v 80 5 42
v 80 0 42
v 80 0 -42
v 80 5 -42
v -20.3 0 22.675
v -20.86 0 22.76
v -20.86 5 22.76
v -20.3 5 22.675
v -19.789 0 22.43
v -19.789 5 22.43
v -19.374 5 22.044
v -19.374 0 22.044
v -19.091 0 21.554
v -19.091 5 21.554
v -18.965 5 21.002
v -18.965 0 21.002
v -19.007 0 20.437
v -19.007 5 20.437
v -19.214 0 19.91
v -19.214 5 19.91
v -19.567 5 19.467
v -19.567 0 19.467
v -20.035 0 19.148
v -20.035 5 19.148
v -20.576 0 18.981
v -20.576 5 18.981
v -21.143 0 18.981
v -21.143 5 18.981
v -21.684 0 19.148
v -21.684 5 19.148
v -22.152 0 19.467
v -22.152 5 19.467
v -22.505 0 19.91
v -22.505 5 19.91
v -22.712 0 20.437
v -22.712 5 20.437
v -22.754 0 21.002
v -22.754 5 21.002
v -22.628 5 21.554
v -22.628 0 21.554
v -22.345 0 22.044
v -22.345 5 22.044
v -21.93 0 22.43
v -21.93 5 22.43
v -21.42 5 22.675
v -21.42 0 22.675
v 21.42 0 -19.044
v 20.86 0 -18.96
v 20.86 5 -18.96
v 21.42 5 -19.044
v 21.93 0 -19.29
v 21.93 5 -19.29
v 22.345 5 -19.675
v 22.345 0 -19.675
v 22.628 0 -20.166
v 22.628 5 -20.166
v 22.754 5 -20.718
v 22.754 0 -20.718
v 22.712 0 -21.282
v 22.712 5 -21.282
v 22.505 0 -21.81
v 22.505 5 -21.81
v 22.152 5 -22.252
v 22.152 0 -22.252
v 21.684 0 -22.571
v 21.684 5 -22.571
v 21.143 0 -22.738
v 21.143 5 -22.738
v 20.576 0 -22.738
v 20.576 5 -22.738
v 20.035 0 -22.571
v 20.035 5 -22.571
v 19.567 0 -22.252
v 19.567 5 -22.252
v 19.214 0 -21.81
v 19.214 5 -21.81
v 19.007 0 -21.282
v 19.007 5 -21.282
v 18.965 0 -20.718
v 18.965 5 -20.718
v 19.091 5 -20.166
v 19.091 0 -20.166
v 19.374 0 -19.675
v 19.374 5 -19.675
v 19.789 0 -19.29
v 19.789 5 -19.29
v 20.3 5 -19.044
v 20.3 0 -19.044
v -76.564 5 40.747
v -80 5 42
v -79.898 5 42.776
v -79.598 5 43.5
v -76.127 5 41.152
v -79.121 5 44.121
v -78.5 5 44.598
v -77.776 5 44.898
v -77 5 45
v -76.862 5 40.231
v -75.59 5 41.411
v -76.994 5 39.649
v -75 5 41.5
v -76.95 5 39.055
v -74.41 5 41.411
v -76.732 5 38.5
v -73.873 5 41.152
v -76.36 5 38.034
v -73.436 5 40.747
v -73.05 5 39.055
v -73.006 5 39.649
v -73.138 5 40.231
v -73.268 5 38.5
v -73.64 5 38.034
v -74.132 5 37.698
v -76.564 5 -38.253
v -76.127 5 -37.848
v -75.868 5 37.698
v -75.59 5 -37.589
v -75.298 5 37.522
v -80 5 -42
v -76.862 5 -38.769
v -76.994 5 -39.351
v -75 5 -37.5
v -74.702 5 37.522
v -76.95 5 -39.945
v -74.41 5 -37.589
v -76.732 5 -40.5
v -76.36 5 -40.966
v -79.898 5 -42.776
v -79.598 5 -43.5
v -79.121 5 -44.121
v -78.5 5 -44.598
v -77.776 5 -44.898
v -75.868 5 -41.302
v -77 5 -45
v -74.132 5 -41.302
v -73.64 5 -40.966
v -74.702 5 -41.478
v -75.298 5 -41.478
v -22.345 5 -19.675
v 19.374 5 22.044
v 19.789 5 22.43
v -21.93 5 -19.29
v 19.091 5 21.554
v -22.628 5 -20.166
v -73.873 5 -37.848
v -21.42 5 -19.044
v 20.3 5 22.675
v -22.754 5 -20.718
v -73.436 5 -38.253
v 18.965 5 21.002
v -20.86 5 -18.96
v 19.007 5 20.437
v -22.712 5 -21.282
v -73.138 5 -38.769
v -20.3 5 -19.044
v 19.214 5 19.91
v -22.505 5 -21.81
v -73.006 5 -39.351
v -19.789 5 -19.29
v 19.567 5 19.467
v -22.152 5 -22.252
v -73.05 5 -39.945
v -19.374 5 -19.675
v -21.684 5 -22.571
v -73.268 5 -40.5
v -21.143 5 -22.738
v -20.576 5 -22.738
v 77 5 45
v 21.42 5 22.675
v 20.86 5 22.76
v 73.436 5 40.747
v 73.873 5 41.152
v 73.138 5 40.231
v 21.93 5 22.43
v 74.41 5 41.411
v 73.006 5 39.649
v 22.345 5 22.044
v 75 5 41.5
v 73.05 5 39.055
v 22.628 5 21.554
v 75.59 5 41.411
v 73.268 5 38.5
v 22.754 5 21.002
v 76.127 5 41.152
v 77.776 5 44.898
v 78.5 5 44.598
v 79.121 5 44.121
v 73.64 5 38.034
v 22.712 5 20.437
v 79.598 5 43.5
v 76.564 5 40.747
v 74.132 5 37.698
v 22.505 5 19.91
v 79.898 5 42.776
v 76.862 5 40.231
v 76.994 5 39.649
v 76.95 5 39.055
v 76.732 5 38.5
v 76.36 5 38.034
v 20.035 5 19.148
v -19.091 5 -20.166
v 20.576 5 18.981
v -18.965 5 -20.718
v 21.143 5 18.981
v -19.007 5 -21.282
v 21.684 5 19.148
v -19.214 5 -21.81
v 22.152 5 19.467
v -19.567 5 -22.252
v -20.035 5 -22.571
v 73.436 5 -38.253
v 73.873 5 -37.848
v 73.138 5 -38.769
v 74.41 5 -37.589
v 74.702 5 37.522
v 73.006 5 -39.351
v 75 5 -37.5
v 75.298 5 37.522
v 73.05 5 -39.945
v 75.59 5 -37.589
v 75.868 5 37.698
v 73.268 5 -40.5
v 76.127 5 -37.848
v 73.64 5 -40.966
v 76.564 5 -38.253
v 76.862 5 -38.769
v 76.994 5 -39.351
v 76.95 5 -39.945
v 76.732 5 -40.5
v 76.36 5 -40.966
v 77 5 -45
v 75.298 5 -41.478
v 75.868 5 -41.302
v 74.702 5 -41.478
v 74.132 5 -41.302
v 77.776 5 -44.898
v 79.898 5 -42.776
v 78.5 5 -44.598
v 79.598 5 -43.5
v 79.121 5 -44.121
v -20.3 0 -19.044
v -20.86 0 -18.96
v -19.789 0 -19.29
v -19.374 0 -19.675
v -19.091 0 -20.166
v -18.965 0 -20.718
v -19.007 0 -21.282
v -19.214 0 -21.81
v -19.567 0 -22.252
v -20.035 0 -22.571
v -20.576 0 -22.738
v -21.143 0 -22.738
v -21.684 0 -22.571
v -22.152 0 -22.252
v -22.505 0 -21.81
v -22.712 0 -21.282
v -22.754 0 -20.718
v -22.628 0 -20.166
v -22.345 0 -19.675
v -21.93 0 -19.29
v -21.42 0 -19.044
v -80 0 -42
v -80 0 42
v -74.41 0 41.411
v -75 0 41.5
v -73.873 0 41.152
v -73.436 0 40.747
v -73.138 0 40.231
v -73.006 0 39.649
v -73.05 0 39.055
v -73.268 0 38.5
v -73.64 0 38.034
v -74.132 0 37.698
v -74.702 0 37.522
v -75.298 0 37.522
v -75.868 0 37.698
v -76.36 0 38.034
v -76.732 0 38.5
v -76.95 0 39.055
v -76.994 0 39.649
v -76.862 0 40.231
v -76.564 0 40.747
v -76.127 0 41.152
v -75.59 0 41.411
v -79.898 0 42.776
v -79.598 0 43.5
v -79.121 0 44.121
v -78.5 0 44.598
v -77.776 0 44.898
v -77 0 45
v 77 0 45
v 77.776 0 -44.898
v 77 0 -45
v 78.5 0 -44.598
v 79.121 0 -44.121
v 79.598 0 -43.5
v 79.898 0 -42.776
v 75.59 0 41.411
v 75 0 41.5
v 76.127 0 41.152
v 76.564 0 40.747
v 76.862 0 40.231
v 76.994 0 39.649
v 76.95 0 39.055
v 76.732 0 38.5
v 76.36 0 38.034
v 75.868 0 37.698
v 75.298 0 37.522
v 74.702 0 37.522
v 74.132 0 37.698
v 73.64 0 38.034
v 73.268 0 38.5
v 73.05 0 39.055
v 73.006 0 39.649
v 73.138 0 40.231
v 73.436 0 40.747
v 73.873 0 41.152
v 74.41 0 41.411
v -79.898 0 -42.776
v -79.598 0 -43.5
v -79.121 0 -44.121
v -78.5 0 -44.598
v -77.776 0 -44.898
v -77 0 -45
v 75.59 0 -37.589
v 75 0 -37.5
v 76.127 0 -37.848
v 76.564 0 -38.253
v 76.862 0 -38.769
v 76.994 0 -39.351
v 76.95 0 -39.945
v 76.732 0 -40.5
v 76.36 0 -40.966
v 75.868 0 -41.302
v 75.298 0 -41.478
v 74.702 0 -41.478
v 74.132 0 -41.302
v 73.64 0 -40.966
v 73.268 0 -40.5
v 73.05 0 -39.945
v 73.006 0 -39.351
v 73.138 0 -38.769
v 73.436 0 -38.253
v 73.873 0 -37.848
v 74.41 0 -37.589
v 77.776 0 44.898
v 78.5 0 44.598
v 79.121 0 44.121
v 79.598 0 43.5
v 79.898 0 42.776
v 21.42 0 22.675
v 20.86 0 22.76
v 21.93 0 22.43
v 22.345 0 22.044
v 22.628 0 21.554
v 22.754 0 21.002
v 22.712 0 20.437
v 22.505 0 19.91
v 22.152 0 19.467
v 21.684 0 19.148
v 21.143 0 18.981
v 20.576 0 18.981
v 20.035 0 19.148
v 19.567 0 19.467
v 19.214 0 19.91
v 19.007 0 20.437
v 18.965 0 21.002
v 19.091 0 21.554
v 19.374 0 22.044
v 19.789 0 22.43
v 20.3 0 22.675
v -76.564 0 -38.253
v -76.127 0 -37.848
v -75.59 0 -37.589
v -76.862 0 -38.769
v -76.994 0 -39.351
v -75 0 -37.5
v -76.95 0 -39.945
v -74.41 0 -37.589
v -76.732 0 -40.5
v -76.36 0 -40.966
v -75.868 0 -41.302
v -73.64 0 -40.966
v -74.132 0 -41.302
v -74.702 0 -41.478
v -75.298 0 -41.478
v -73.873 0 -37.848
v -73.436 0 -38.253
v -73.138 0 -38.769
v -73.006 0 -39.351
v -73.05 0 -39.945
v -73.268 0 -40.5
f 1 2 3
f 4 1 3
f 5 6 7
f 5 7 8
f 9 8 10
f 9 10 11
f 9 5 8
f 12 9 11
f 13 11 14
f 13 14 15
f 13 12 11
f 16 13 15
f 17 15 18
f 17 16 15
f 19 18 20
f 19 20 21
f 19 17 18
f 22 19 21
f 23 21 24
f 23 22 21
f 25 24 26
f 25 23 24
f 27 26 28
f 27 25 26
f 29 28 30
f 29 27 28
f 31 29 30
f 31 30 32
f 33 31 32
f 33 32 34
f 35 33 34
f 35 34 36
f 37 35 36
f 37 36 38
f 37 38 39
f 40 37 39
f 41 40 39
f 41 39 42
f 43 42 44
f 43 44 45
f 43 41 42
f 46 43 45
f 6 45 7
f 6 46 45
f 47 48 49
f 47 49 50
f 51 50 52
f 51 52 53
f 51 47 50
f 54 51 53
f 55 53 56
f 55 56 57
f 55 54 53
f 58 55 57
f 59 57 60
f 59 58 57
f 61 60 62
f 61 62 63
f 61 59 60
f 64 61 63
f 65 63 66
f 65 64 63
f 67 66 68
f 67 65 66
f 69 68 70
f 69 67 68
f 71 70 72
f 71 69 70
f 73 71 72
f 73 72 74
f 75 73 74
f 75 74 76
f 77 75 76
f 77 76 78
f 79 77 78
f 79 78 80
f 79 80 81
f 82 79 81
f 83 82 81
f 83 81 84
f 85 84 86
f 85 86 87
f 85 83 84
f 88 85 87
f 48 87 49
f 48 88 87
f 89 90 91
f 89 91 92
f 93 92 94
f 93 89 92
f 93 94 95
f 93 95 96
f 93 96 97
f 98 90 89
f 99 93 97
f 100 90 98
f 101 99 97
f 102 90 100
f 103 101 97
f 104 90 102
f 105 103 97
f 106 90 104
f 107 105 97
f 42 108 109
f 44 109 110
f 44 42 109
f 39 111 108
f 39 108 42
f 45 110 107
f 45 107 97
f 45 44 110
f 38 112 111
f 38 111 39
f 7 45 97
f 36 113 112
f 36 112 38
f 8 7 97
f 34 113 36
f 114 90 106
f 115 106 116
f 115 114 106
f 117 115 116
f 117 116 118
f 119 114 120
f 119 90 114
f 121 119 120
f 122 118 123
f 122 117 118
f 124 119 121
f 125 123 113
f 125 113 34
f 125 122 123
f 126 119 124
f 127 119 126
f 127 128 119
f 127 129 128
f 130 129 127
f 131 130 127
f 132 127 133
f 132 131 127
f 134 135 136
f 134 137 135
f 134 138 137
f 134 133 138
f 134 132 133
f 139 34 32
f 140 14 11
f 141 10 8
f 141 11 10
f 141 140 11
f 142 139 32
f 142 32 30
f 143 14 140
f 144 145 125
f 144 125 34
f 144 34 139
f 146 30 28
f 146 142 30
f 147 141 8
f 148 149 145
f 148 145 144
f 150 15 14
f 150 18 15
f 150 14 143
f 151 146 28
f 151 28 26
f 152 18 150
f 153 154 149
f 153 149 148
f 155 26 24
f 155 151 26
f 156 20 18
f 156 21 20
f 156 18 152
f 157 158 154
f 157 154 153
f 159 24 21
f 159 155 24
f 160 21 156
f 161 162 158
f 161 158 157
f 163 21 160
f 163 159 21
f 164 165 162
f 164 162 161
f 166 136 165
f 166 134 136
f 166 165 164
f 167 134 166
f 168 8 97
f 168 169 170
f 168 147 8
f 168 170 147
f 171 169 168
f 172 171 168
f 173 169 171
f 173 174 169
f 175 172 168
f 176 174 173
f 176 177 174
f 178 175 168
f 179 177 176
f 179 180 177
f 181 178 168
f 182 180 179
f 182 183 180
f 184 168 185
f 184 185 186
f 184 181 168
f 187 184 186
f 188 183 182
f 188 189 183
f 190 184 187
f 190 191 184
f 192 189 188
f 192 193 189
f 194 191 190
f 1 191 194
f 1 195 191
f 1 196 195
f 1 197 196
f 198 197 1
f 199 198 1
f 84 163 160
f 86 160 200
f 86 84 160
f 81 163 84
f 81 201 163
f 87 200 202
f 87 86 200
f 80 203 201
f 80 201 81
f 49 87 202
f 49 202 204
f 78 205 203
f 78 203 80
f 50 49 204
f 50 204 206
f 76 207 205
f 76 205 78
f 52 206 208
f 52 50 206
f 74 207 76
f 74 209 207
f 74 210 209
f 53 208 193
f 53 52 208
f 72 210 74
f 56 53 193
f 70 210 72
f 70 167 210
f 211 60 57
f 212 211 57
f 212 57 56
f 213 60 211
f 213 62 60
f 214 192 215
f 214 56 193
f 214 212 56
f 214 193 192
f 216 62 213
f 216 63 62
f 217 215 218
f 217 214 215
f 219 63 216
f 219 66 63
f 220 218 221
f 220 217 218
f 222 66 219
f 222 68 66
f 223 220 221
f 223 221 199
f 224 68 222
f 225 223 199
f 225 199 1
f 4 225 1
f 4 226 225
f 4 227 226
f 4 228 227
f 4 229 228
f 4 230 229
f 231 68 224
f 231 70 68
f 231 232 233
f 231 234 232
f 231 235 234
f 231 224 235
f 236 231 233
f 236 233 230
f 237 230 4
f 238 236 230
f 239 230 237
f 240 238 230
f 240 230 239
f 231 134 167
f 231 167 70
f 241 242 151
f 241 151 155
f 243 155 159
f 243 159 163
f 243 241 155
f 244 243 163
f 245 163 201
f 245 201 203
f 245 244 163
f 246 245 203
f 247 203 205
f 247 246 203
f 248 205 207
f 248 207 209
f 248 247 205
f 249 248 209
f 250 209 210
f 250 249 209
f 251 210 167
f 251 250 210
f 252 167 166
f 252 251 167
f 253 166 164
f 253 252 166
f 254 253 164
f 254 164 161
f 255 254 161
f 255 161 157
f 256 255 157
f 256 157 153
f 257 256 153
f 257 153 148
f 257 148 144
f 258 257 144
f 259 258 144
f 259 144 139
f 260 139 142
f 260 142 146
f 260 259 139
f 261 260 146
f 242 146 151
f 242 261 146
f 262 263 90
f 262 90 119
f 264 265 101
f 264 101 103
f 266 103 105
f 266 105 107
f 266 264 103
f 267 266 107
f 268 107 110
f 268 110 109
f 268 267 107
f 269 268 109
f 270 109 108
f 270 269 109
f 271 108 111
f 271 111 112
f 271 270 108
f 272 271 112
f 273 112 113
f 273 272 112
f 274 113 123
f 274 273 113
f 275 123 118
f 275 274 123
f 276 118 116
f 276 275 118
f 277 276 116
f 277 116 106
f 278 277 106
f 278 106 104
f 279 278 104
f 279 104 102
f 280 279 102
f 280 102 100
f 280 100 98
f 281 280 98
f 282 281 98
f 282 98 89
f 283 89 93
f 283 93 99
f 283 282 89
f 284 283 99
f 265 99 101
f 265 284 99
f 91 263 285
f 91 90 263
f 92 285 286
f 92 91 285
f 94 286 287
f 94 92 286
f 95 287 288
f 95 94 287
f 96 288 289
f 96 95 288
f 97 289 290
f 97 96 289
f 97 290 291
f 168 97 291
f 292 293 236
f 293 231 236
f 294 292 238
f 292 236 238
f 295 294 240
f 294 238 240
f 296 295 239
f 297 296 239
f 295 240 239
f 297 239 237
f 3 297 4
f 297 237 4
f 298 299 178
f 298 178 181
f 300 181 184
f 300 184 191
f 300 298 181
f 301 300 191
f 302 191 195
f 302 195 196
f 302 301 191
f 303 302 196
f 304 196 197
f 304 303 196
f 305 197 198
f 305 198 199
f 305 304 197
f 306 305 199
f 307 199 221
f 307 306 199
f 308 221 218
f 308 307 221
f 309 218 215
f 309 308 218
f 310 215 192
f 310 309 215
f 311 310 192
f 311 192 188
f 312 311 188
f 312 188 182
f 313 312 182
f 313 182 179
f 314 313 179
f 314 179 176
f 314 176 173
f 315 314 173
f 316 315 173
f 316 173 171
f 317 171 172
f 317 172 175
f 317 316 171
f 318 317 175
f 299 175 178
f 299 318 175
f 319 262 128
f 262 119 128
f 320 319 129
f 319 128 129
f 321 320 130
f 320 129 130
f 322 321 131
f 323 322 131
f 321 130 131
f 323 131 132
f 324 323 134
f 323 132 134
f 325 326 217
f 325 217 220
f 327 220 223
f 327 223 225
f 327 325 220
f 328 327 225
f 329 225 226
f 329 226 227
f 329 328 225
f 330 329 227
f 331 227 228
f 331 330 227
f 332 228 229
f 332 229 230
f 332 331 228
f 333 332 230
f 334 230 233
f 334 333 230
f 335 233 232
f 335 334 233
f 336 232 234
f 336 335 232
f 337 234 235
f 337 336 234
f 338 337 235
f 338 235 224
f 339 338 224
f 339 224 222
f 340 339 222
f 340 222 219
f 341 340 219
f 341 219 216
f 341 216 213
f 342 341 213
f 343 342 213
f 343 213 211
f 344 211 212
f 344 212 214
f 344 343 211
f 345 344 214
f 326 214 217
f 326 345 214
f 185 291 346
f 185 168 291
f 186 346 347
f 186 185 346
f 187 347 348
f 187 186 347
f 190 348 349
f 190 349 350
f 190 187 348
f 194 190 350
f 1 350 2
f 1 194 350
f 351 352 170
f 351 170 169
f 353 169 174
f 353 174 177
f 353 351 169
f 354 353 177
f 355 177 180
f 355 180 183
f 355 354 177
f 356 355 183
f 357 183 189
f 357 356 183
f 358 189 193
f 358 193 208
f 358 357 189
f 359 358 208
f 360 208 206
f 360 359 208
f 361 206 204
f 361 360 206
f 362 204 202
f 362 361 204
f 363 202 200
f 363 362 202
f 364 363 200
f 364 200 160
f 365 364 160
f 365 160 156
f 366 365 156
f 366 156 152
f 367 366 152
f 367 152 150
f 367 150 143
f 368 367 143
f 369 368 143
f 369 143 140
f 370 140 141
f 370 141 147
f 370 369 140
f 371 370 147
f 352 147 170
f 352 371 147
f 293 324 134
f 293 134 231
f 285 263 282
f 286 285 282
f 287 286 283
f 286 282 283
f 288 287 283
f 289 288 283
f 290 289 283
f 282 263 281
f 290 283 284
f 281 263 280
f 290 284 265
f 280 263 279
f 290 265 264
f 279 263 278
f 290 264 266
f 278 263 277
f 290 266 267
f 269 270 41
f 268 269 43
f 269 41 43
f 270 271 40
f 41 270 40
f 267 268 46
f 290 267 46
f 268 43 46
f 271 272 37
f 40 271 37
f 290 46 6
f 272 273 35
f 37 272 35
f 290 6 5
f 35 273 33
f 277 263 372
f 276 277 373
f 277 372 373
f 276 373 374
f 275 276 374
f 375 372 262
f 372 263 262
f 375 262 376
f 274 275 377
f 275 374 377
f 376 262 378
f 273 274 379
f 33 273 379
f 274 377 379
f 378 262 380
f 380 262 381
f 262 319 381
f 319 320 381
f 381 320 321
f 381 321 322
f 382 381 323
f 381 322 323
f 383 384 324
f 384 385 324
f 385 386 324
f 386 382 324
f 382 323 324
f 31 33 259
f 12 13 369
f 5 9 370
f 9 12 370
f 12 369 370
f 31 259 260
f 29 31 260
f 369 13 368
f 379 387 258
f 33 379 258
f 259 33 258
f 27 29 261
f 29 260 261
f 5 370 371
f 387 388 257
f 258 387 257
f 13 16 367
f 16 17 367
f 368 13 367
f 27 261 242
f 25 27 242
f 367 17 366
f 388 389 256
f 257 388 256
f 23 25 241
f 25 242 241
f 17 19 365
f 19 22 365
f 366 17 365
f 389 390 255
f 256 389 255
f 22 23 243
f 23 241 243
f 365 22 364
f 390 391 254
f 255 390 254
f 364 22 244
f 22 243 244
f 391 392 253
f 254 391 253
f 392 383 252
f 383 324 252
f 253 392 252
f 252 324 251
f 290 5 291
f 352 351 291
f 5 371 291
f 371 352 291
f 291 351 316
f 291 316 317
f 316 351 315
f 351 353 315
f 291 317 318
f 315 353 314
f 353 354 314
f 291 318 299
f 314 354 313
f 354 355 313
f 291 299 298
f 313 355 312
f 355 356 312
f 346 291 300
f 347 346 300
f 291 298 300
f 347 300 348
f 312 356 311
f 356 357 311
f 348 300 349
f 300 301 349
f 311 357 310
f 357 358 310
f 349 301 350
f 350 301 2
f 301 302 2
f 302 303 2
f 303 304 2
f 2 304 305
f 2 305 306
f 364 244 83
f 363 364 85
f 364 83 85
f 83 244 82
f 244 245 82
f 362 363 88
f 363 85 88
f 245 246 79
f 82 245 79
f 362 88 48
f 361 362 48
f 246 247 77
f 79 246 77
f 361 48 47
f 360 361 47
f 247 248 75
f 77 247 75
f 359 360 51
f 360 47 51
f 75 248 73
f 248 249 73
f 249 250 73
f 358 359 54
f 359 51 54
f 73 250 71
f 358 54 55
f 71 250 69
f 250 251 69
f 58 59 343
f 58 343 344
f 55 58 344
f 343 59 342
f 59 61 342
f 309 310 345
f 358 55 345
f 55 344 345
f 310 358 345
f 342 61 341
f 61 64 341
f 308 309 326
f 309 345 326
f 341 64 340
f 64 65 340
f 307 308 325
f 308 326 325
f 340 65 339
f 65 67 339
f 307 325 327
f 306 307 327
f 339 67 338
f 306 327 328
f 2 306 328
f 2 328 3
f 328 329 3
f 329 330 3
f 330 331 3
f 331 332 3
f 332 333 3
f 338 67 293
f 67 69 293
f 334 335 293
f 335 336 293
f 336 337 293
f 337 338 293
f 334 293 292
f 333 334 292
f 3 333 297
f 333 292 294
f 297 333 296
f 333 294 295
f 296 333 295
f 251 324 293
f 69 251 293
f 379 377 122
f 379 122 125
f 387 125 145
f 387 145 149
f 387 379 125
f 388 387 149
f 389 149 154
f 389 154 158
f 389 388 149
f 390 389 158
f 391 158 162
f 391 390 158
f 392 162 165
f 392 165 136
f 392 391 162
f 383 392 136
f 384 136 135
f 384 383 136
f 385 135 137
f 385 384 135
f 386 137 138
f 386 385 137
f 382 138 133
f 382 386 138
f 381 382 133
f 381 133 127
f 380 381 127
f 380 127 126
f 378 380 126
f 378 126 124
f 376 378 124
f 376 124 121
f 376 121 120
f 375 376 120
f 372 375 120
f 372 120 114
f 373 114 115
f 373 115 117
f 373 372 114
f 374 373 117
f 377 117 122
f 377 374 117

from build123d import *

# Parameters (mm, degrees)
SKETCH_1_W      = 160
SKETCH_1_H      = 90
SKETCH_1_R      = 1.9
SKETCH_1_R_2    = 2
EXTRUDE_1_DEPTH = 5
FILLET_5_R      = 3


with BuildPart() as part:
    # Эскиз1 → Бобышка-Вытянуть1 (new body)
    with BuildSketch(Plane(origin=(0, 0, 0), x_dir=(1, 0, 0), z_dir=(0, 1, 0))):
        Rectangle(SKETCH_1_W, SKETCH_1_H)
        with Locations(Location((20.859650045, 20.859650045, 0), (0, 0, 270))):
            Circle(SKETCH_1_R, mode=Mode.SUBTRACT)
        with Locations(Location((20.859650045, -20.859650045, 0), (0, 0, 270))):
            Circle(SKETCH_1_R, mode=Mode.SUBTRACT)
        with Locations(Location((-20.859650045, -20.859650045, 0), (0, 0, 270))):
            Circle(SKETCH_1_R, mode=Mode.SUBTRACT)
        with Locations(Location((-20.859650045, 20.859650045, 0), (0, 0, 270))):
            Circle(SKETCH_1_R, mode=Mode.SUBTRACT)
        with Locations(Location((-75, 39.5, 0), (0, 0, 270))):
            Circle(SKETCH_1_R_2, mode=Mode.SUBTRACT)
        with Locations(Location((75, 39.5, 0), (0, 0, 270))):
            Circle(SKETCH_1_R_2, mode=Mode.SUBTRACT)
        with Locations(Location((75, -39.5, 0), (0, 0, 270))):
            Circle(SKETCH_1_R_2, mode=Mode.SUBTRACT)
        with Locations(Location((-75, -39.5, 0), (0, 0, 270))):
            Circle(SKETCH_1_R_2, mode=Mode.SUBTRACT)
    extrude(amount=EXTRUDE_1_DEPTH)

    # Скругление5
    fillet_5_edges = [part.edges().sort_by_distance(p)[0] for p in [
        (80, 2.5, 45),
        (-80, 2.5, 45),
        (-80, 2.5, -45),
        (80, 2.5, -45),
    ]]
    fillet(fillet_5_edges, radius=FILLET_5_R)


solid = part.part
